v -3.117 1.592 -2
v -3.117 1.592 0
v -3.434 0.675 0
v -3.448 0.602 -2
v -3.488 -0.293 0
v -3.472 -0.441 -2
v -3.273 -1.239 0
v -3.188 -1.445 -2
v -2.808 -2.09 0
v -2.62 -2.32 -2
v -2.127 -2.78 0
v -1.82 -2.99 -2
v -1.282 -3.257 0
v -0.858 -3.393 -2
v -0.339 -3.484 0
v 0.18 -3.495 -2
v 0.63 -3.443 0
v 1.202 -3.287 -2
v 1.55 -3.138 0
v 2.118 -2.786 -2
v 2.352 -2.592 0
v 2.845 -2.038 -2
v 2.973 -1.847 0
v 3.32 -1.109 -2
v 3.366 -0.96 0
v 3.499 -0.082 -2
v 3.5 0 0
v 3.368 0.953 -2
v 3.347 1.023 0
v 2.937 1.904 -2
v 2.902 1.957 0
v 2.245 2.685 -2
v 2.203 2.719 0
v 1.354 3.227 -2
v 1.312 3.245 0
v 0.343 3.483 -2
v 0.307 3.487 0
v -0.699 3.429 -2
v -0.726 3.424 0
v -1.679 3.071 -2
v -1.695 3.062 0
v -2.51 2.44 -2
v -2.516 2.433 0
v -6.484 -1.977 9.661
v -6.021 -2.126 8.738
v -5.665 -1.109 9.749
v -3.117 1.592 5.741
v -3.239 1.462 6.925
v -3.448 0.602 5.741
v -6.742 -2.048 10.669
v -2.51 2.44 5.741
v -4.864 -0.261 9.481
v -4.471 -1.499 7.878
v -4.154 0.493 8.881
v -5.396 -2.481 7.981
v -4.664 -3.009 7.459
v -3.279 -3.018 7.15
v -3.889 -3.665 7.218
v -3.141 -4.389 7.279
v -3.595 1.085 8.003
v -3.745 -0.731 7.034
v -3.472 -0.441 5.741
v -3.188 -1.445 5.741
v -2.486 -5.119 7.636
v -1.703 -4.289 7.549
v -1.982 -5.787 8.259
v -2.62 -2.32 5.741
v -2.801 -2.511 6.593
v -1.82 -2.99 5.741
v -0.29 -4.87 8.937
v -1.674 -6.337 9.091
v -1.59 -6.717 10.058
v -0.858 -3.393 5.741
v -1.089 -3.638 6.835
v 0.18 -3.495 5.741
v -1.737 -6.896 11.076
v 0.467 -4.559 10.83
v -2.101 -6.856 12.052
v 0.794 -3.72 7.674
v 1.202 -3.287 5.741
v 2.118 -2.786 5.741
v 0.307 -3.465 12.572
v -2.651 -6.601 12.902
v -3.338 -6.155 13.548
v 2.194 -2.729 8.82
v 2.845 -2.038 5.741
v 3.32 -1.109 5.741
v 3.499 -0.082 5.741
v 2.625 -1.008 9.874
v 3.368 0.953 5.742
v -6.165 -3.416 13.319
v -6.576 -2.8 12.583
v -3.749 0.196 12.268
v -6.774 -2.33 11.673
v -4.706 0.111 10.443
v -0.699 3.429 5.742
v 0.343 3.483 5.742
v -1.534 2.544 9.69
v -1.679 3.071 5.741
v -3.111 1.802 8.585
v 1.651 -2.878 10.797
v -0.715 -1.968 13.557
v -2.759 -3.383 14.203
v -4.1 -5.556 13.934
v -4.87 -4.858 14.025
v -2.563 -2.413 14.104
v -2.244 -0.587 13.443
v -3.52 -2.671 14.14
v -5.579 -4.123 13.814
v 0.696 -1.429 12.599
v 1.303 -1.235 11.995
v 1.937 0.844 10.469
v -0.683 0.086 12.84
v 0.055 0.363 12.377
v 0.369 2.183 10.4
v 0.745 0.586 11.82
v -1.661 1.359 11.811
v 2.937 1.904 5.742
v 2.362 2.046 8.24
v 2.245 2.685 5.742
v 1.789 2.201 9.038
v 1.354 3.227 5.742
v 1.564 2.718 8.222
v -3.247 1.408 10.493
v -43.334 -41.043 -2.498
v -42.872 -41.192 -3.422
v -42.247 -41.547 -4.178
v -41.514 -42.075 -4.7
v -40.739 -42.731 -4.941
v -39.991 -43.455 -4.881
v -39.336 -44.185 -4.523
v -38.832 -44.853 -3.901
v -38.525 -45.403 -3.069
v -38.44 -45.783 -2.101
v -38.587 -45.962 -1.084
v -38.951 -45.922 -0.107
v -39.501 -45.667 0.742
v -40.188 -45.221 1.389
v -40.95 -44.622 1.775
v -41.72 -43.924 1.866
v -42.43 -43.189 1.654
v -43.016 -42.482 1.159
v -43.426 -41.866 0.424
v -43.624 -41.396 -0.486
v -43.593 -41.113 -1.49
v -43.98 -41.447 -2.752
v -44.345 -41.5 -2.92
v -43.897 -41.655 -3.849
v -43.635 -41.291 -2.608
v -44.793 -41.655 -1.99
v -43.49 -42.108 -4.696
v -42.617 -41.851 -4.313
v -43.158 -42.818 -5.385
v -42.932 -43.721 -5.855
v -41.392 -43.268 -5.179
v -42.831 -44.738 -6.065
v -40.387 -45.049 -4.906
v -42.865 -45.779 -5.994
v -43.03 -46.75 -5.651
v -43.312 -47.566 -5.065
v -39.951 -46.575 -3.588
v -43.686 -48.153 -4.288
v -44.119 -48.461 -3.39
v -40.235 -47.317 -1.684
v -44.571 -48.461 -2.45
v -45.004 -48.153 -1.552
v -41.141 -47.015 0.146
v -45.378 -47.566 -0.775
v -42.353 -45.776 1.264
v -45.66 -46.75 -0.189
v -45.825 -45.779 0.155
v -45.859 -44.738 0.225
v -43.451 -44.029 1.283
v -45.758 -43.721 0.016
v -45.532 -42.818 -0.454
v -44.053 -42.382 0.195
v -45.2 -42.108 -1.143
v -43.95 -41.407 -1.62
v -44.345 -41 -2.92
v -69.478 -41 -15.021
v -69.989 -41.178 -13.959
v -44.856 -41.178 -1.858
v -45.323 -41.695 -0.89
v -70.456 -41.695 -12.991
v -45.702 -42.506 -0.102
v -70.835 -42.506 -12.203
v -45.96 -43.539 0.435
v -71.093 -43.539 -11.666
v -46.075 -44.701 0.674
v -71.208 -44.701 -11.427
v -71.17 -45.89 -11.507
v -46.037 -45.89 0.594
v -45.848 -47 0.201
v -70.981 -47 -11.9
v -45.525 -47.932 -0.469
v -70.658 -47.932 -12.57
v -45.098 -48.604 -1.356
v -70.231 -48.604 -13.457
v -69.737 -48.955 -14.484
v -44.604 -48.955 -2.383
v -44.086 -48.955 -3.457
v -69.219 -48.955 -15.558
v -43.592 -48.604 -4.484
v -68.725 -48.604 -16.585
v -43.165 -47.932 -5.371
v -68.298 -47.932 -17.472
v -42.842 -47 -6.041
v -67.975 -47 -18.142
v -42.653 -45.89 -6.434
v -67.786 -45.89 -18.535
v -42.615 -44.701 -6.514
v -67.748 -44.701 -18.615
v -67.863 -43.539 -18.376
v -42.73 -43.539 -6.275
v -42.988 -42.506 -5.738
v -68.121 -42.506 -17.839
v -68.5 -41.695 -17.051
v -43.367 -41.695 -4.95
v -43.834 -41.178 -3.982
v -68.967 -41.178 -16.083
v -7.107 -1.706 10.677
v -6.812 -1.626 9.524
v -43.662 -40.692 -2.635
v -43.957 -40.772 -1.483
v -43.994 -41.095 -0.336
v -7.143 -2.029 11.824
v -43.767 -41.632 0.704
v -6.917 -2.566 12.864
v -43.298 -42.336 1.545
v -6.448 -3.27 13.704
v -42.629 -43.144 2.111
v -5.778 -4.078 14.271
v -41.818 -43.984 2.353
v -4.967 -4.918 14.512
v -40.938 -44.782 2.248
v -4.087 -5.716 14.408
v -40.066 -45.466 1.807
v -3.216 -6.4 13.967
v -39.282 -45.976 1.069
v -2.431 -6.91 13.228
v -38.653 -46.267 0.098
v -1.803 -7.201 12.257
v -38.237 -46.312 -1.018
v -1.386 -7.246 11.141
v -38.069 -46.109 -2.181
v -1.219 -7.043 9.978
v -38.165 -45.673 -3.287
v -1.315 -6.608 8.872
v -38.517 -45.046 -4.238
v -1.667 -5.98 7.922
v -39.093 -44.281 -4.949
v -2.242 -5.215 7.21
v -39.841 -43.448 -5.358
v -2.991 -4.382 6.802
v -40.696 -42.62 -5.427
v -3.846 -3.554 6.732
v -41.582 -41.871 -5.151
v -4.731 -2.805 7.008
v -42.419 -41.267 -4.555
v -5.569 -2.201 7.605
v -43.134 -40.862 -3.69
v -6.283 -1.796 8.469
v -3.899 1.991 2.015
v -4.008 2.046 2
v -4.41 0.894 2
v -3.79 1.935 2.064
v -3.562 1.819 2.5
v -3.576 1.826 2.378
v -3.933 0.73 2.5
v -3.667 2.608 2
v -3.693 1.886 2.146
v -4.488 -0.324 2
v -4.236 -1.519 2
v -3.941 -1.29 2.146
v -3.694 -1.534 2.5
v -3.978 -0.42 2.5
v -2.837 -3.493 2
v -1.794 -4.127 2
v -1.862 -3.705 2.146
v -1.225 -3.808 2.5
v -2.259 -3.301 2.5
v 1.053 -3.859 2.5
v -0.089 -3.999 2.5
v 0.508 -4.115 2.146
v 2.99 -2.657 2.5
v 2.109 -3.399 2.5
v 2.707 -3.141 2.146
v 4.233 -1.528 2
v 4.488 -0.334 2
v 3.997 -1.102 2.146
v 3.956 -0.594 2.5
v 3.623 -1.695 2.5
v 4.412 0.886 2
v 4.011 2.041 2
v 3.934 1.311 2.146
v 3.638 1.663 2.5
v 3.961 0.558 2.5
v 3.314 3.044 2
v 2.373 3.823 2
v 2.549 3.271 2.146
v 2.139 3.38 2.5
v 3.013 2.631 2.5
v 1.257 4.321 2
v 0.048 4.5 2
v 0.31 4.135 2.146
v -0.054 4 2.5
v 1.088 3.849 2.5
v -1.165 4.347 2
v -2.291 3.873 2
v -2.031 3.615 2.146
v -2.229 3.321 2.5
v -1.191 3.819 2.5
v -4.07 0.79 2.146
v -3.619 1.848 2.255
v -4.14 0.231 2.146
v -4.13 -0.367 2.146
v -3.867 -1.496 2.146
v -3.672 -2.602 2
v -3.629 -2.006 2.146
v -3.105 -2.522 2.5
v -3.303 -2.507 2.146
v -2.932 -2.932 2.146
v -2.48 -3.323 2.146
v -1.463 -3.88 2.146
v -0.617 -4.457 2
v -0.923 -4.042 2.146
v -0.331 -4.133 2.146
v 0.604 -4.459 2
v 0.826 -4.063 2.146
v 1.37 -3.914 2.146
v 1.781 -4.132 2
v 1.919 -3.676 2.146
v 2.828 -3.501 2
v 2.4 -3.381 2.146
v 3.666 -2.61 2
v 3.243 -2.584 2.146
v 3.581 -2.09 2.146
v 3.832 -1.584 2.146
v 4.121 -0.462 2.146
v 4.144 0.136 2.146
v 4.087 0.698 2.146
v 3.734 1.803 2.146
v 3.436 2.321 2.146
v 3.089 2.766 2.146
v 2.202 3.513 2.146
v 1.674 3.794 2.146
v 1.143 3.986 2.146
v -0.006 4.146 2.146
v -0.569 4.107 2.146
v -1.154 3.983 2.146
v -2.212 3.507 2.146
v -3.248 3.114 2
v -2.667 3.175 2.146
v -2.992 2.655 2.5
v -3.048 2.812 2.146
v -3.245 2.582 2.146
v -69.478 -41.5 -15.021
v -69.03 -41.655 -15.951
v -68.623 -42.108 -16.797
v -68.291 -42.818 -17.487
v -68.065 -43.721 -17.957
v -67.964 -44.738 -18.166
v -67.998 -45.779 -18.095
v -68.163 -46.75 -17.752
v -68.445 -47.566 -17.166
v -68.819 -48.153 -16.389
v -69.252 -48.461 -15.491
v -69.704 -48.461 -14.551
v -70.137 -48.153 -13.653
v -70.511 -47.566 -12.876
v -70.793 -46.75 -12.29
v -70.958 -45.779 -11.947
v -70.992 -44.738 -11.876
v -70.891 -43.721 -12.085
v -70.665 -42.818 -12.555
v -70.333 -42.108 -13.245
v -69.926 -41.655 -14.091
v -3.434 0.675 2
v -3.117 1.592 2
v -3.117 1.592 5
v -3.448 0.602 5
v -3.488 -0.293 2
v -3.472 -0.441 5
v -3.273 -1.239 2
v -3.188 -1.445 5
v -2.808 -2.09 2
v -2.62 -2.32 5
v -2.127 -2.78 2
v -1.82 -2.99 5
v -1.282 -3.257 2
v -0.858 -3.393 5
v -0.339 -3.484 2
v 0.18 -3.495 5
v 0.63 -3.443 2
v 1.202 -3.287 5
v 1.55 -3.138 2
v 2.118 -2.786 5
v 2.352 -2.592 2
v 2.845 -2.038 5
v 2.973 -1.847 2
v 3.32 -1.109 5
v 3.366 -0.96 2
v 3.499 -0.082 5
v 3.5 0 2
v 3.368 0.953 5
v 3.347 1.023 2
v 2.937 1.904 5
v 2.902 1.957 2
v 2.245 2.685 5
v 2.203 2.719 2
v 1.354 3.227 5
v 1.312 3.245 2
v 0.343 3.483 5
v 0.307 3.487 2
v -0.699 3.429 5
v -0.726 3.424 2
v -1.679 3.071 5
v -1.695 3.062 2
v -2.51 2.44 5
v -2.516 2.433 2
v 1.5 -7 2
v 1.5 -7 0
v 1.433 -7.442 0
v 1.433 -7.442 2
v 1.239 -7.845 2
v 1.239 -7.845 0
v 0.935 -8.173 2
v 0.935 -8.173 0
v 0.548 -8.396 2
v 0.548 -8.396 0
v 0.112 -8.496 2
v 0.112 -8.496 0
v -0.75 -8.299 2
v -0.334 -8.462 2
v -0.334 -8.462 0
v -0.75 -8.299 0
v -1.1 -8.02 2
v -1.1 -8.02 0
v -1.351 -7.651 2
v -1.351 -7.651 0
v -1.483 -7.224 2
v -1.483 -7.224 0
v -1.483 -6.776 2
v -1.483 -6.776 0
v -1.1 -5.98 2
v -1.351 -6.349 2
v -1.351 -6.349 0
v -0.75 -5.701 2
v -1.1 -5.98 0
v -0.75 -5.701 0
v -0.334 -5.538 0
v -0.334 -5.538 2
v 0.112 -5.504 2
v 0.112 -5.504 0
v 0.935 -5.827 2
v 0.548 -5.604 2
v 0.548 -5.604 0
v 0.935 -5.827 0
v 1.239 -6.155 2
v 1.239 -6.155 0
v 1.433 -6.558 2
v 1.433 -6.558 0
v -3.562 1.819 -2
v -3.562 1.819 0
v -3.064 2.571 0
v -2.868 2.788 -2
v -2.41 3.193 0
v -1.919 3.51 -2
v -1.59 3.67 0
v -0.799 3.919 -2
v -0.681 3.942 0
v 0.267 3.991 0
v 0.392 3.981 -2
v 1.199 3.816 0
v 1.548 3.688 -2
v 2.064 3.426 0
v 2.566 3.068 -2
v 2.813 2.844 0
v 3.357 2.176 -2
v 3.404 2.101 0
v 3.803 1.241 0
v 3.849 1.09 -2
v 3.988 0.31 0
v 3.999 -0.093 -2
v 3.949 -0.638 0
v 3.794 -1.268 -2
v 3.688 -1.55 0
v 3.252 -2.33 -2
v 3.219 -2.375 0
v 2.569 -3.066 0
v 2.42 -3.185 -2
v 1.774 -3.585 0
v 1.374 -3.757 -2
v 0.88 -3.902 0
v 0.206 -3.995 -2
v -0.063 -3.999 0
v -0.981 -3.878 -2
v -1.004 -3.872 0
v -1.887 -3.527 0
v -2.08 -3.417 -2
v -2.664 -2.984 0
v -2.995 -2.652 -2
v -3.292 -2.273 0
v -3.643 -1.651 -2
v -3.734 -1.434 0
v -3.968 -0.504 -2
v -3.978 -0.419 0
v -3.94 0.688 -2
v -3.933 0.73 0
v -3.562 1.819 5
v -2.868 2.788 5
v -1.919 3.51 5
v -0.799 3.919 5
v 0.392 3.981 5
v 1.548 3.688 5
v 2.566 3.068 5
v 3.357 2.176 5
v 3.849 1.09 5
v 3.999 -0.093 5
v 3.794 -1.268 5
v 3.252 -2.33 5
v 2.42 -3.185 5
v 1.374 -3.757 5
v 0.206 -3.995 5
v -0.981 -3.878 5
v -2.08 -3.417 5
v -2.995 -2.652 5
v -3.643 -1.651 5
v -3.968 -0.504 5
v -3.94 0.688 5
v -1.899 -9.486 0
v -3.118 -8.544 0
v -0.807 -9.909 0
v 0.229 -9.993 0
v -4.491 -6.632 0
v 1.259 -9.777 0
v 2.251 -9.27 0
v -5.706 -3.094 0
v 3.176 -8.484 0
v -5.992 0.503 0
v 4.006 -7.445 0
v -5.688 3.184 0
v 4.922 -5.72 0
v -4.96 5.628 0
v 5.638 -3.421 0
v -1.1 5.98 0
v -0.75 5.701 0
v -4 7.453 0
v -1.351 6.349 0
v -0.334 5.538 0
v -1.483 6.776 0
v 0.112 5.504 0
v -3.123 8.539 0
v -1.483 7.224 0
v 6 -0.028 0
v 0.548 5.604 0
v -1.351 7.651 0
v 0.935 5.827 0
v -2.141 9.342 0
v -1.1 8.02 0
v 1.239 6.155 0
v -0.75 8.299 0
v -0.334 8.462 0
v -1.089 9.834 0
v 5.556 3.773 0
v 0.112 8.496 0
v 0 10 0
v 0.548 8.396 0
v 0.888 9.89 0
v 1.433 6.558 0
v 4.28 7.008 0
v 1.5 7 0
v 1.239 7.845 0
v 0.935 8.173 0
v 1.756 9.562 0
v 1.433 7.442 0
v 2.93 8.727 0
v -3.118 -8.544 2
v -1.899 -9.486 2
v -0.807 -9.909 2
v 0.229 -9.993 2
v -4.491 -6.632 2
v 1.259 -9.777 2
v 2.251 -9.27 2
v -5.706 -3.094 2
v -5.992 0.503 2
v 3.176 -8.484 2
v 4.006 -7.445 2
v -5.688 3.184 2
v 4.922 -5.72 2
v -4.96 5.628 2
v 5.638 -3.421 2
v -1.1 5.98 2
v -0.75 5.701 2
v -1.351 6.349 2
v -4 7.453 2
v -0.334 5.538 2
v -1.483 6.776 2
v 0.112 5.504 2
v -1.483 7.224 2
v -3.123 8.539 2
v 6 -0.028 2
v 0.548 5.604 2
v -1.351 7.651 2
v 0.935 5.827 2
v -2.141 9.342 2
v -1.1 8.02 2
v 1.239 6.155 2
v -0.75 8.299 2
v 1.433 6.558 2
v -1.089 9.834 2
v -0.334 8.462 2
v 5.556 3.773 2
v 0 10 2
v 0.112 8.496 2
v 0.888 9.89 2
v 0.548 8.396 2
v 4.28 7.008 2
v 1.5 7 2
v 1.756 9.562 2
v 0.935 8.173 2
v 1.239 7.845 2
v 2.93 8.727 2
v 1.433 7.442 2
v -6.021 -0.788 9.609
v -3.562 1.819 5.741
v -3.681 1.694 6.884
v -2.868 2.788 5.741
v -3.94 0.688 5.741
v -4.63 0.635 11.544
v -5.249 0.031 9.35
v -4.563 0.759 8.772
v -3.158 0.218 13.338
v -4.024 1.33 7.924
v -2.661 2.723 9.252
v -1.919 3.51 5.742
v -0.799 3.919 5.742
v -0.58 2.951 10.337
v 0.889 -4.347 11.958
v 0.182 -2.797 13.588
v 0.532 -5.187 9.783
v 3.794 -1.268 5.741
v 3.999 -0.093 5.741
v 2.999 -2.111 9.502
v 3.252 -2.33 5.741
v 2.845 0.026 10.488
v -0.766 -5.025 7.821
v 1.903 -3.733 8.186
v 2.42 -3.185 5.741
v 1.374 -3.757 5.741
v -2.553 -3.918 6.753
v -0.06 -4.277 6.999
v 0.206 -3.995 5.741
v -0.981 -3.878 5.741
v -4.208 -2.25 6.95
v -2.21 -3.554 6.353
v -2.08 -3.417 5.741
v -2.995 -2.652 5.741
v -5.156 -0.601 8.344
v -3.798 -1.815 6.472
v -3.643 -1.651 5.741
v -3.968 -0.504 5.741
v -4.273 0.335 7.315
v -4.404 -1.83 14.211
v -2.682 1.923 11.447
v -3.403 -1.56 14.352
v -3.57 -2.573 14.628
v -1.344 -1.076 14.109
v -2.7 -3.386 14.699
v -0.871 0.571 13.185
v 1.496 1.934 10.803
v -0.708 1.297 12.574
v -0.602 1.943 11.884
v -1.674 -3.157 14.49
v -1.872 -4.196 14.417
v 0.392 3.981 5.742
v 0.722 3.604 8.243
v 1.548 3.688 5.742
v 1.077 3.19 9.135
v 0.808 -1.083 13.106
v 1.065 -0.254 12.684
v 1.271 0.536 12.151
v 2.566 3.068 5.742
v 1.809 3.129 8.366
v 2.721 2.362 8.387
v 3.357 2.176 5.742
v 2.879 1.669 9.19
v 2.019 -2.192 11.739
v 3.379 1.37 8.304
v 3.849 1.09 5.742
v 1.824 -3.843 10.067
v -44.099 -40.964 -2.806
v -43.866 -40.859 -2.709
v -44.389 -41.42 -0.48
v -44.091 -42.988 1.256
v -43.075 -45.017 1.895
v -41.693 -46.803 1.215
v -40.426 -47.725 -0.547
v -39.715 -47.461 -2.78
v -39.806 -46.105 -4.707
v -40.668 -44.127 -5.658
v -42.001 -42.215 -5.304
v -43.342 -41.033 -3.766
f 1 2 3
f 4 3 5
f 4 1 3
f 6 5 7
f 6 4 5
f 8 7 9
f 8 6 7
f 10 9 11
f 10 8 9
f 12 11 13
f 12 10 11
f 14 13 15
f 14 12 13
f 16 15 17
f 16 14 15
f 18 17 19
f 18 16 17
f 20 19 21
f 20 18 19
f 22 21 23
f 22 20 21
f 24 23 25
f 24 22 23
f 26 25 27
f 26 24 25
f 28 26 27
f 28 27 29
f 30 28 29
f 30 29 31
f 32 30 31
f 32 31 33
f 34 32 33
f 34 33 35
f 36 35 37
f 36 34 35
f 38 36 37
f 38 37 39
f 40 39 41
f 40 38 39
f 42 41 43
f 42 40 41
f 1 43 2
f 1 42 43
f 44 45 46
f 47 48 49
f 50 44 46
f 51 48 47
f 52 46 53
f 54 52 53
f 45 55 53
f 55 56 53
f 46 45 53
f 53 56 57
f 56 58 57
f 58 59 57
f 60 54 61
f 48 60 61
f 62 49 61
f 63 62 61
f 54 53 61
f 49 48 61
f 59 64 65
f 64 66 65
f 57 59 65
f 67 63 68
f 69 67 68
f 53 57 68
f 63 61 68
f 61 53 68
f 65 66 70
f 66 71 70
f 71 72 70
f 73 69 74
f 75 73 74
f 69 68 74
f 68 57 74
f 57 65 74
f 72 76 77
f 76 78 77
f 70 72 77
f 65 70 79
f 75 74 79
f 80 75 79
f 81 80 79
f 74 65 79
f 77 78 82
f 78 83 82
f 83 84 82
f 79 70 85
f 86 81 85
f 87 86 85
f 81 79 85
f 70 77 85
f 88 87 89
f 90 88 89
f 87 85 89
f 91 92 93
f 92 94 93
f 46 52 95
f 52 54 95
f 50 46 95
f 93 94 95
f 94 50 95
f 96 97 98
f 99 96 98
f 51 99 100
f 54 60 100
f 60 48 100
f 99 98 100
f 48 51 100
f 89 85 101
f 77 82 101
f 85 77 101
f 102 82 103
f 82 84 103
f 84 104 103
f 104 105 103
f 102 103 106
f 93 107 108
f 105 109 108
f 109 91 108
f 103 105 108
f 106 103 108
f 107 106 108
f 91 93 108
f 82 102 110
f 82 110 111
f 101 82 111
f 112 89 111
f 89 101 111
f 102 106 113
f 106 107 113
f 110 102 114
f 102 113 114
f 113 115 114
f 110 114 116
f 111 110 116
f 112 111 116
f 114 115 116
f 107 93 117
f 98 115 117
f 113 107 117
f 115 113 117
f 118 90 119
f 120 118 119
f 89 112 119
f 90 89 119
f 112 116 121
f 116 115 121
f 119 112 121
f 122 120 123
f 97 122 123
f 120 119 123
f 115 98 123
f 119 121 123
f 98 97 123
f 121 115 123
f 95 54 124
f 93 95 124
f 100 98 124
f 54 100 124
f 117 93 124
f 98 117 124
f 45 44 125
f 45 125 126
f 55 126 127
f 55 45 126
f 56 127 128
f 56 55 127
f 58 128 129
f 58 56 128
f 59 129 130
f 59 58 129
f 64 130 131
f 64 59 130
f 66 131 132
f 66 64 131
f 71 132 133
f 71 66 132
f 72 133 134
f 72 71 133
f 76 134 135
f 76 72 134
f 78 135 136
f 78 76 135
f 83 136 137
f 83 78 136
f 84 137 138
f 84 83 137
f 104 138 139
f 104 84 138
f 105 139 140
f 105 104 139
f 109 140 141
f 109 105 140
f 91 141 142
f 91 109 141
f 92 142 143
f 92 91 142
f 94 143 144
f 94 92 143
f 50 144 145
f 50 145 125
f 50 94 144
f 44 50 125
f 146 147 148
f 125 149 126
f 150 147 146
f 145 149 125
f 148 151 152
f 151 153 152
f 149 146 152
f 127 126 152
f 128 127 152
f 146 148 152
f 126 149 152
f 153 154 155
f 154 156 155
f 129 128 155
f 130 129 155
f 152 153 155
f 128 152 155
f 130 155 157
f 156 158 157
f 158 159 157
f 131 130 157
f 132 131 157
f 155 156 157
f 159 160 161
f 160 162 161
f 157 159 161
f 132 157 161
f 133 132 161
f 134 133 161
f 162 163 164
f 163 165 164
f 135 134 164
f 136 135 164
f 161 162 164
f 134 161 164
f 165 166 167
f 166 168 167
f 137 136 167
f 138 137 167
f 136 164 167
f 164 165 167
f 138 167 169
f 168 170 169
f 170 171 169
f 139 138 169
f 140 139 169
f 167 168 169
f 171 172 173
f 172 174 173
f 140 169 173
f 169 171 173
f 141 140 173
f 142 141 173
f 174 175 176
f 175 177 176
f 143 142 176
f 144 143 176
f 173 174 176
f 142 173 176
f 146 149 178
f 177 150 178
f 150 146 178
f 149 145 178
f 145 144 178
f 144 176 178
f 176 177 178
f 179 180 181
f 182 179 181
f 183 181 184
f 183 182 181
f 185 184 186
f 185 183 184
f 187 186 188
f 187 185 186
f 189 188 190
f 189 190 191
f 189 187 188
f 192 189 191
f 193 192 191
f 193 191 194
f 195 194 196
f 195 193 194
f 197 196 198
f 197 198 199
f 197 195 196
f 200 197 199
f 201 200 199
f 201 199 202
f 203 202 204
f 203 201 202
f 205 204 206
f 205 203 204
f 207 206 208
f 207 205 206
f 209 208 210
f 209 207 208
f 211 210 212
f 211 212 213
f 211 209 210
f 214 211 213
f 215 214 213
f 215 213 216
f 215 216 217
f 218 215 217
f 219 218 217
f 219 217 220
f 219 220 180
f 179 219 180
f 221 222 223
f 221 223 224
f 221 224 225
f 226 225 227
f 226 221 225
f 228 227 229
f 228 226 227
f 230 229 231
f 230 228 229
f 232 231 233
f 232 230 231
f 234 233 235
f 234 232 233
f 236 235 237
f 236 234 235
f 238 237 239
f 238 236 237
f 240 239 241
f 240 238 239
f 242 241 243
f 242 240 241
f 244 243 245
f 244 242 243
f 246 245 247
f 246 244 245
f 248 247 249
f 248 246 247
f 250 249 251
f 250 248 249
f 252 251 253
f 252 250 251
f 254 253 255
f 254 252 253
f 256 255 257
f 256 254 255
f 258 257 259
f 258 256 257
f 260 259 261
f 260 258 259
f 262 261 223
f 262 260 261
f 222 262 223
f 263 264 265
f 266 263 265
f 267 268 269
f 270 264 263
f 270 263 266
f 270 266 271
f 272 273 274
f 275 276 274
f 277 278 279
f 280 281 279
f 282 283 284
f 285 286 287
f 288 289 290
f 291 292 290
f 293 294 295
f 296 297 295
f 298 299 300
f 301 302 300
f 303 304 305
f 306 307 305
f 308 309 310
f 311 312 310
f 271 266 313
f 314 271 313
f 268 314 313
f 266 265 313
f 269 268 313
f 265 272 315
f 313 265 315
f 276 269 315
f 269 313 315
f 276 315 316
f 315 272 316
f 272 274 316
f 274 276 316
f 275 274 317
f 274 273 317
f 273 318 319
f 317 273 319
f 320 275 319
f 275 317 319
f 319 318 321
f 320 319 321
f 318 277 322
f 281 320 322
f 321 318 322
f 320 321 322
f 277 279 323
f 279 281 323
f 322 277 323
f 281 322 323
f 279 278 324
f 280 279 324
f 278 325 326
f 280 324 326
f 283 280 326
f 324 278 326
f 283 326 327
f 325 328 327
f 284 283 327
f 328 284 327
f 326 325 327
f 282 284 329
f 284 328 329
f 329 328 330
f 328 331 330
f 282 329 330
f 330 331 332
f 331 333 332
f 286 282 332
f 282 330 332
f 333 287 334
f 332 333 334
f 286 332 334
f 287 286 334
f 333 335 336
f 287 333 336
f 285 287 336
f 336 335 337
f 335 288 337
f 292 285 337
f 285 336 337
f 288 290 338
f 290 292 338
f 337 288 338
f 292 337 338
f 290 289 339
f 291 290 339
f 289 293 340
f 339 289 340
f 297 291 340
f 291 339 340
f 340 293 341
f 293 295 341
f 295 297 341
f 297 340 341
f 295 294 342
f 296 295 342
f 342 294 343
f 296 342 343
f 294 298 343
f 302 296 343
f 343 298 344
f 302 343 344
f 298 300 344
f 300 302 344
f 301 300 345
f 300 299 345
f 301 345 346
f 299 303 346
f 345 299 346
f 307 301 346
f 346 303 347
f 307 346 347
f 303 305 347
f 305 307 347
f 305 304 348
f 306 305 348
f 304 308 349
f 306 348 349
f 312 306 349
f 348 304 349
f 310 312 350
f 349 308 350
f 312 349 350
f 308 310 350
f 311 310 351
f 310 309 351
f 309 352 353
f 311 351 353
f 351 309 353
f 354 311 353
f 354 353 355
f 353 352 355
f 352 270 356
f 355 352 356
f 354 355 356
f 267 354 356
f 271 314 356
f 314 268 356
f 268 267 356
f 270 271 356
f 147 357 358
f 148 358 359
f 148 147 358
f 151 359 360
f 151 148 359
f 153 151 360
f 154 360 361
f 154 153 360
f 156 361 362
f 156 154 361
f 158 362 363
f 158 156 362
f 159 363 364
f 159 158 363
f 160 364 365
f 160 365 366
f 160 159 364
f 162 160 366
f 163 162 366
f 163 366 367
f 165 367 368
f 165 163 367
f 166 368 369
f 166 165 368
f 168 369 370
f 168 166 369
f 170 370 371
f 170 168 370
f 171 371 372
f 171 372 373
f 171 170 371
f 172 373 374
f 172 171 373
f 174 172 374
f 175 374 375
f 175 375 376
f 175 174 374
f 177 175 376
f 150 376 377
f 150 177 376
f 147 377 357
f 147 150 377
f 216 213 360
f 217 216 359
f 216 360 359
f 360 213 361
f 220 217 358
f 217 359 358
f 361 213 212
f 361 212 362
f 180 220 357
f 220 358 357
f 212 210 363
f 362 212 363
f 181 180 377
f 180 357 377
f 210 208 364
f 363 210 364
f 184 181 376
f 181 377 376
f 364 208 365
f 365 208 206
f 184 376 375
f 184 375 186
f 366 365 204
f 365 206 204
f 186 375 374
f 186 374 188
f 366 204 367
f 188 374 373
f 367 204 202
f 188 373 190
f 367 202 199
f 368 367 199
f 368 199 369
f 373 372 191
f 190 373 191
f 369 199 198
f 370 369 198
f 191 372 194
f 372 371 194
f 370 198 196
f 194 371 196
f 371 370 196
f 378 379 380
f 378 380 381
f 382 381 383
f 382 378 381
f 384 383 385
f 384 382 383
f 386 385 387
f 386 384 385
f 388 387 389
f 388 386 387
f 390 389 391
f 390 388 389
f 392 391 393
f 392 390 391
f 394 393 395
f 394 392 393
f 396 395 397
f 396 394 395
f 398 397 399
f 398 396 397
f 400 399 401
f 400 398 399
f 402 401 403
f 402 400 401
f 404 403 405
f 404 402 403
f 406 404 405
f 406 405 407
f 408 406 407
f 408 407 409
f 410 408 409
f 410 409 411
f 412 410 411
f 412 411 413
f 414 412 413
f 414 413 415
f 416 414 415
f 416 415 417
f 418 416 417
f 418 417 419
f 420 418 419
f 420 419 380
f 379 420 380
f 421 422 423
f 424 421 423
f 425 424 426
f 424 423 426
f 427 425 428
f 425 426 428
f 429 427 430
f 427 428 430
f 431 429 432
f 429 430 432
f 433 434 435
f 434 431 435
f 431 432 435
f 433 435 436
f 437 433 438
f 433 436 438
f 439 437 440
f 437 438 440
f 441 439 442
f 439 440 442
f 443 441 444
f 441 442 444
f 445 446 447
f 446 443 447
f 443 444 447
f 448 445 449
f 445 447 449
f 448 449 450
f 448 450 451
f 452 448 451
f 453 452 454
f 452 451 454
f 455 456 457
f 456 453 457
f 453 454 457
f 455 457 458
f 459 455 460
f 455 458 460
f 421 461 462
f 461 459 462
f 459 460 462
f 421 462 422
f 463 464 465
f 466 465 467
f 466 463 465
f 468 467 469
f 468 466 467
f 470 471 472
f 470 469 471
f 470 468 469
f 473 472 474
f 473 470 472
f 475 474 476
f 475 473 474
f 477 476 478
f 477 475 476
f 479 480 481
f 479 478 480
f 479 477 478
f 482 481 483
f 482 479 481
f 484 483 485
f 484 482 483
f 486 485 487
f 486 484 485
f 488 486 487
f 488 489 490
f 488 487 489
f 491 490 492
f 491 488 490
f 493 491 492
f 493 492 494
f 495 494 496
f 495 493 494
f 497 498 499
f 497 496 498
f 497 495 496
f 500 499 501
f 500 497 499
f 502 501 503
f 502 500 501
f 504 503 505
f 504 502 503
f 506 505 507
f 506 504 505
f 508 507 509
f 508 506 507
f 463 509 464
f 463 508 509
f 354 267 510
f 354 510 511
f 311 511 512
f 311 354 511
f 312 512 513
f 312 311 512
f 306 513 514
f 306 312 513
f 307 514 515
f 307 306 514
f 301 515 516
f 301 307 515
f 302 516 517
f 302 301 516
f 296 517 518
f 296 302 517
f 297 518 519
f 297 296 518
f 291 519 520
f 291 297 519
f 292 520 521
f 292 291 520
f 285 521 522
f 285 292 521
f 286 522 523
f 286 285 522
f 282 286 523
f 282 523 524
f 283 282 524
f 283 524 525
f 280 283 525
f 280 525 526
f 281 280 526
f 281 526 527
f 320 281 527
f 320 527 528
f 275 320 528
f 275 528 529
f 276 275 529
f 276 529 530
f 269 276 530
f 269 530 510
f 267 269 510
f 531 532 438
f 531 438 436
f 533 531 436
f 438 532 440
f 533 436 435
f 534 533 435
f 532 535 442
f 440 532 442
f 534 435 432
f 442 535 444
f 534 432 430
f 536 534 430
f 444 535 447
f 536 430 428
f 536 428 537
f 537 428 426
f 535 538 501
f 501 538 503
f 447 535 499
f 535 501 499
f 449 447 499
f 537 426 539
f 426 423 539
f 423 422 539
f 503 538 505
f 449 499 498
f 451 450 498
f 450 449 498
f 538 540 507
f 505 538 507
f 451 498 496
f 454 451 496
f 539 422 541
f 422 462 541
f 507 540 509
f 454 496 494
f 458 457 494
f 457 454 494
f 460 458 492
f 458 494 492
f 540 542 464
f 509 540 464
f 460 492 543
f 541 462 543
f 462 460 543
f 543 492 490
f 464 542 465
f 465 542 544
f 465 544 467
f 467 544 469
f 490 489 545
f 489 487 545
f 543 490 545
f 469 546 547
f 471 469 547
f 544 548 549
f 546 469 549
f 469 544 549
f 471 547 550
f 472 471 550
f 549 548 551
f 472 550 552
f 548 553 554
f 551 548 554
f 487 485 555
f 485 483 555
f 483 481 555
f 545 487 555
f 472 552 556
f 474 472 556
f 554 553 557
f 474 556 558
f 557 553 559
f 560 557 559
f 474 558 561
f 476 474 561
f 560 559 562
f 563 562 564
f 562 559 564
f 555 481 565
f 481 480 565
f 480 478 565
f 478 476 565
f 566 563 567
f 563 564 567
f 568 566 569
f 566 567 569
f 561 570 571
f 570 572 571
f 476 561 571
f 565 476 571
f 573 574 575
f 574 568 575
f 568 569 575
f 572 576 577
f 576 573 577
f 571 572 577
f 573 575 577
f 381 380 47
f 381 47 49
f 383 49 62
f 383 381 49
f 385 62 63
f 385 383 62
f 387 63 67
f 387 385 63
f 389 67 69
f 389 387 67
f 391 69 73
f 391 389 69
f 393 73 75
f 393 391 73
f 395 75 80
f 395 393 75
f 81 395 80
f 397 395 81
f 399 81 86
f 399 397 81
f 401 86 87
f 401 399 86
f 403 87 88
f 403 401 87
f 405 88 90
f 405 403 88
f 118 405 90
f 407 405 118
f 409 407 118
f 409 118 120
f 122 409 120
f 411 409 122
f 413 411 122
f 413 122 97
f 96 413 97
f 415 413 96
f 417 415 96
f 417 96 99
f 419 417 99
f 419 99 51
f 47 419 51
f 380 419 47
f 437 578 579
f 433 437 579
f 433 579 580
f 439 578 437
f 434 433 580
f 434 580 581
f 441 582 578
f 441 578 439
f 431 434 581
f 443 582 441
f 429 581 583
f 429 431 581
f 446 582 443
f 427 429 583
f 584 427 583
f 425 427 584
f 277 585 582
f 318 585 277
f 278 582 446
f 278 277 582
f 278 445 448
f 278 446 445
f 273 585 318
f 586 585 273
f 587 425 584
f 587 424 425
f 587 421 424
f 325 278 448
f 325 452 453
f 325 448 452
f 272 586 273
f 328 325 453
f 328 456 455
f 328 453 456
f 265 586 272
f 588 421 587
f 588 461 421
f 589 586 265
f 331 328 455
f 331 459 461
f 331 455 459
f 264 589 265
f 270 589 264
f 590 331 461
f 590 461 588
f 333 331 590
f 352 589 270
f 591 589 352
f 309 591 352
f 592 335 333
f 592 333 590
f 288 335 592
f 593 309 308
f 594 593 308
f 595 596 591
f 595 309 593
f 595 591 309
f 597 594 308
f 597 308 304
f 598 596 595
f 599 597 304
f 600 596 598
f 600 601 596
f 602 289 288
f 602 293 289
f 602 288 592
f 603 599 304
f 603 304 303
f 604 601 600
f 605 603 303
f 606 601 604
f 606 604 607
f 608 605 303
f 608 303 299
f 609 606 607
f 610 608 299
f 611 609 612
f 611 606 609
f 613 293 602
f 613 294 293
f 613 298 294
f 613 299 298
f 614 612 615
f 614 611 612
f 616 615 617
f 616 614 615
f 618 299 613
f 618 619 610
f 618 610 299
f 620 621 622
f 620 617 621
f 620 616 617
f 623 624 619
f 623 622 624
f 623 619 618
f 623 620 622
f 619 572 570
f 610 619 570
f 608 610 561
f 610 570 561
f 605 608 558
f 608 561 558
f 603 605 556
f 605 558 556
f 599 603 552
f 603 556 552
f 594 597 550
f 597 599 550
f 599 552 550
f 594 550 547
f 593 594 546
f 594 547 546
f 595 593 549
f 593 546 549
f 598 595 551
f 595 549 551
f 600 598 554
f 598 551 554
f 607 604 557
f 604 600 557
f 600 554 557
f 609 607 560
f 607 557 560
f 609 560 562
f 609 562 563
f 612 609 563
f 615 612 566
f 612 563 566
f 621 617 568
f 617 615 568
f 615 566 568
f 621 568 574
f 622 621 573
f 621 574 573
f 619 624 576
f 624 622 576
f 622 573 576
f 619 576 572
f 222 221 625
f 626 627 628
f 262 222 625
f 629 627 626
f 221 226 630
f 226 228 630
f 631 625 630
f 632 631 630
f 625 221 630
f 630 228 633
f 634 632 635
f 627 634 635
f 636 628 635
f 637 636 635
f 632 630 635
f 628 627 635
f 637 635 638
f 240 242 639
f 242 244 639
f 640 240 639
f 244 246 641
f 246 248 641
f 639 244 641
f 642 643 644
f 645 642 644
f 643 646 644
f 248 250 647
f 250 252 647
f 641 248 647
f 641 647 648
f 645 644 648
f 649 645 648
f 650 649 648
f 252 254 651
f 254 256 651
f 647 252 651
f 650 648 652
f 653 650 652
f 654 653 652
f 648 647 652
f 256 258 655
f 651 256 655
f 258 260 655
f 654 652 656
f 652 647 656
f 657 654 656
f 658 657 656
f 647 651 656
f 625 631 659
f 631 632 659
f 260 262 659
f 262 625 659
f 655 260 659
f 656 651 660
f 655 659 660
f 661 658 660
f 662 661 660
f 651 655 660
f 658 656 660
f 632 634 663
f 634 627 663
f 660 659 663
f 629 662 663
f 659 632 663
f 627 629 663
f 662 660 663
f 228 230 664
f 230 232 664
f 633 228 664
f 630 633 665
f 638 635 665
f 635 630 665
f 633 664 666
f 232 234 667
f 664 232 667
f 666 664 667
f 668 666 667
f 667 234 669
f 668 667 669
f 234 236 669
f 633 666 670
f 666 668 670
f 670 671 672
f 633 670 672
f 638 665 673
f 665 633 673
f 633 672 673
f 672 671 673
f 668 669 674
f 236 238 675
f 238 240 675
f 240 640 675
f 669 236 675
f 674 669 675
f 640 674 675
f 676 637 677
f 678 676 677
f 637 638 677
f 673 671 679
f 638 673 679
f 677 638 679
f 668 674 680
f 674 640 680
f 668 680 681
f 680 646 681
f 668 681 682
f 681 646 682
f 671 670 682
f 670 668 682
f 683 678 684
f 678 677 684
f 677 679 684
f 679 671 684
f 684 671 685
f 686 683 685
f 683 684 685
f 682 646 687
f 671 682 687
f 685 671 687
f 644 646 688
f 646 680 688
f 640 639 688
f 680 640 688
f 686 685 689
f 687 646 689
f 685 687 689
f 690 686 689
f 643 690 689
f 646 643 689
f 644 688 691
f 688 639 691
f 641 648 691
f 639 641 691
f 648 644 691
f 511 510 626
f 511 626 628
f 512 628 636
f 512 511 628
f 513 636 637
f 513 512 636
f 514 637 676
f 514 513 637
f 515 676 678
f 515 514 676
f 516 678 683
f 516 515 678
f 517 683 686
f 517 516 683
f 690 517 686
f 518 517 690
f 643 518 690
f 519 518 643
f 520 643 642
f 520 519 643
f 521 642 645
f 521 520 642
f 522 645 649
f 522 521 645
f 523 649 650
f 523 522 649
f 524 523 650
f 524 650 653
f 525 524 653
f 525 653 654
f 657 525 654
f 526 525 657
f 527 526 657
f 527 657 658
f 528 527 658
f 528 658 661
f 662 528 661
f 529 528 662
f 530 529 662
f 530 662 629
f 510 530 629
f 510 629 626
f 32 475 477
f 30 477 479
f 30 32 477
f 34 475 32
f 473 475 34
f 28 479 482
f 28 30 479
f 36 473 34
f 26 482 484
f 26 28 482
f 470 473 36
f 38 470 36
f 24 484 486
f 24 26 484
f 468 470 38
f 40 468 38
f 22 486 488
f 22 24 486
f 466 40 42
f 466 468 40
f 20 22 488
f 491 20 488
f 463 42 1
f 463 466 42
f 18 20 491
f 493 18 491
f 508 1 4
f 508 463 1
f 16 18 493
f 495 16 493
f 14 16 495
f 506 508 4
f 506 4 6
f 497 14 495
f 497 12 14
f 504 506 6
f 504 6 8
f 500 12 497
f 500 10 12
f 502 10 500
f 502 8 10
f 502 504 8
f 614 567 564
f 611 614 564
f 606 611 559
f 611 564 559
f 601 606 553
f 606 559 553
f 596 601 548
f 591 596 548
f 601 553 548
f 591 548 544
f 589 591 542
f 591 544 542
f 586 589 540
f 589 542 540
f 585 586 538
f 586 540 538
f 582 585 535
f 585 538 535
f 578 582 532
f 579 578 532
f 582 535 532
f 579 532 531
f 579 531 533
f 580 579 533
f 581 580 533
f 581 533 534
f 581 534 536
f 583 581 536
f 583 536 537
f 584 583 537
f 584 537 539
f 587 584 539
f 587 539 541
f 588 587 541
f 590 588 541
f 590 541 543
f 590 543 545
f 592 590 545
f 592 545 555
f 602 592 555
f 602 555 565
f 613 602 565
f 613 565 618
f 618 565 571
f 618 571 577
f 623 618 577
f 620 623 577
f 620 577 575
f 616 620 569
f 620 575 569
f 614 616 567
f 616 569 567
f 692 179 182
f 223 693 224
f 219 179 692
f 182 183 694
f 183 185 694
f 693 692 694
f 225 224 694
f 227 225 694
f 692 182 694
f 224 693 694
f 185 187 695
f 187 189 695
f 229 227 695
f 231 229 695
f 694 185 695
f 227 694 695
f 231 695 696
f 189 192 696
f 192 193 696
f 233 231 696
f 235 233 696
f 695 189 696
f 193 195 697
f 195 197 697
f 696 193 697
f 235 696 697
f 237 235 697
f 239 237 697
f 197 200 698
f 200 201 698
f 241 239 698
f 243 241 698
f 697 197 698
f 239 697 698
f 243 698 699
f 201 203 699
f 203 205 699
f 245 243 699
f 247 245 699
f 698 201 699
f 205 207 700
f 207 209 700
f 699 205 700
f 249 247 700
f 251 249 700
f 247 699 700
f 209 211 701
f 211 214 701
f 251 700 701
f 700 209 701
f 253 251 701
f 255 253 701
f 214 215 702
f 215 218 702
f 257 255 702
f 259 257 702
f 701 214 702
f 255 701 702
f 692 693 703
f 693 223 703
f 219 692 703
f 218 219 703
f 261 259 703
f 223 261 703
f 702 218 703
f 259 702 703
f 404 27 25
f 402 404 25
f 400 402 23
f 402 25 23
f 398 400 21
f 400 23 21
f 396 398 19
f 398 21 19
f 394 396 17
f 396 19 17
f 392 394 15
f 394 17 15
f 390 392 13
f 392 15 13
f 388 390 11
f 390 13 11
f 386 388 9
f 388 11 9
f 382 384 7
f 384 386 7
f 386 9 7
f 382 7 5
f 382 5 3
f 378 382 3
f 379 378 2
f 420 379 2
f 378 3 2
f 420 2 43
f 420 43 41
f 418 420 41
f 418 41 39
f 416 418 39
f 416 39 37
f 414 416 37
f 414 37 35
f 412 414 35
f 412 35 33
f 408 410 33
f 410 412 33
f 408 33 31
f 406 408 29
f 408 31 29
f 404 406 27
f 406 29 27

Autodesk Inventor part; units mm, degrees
ref_plane "YZ Plane" through (0, 0, 0) normal (1, 0, 0) x (0, 1, 0)
sketch "Sketch1" plane through (0, 0, 0) normal (0, 0, 1) x (1, 0, 0)
  line L0 (0, 0) -> (0, 10) construction
  line L1 (0, 0) -> (6, 0) construction
  circle A0 centre (0, 0) radius 3.5
  circle A1 centre (0, 7) radius 1.5
  circle A2 centre (0, -7) radius 1.5
  ellipse E0 centre (0, 0) end of major axis (6, 0) minor radius 10
  dimension "d0" = 10
  dimension "d1" = 6
  dimension "d2" = 7
  dimension "d4" = 3
  dimension "d5" = 3
  dimension "d6" = 7
  dimension "d7" = 7
extrude "Extrusion1" add sketch "Sketch1" along normal blind 2
sketch "Sketch2" plane through (0, 0, 0) normal (1, 0, 0) x (0, 1, 0)
  line L0 (0, -2) -> (0, 5) construction
  point P0 (0, 0)
  dimension "d10" = 2
  dimension "d11" = 7
ref_plane "Work Plane1" through (0, -45, 0) normal (0, 1, 0) x (-1, 0, 0)
sketch "Sketch3" plane through (0, -45, 0) normal (0, 1, 0) x (-1, 0, 0)
  line L0 (0, 0) -> (0, -83.2566) construction
  line L1 (69.478, -15.021) -> (43.1392, -69.7245) construction
  line L2 (69.478, -15.021) -> (42.448, -2.0065) construction
  dimension "d13" = 25.71
  dimension "d14" = 69.478
  dimension "d16" = 15.021
  dimension "d17" = 30
  dimension "d18" = 90
ref_plane "Work Plane2" through (-69.478, -45, -15.021) normal (0.9010013, 0, 0.4338163) x (0, 1, 0)
sketch "Sketch4" plane through (-69.478, -45, -15.021) normal (0.9010013, 0, 0.4338163) x (0, 1, 0)
  circle A0 centre (0, 0) radius 4
  circle A1 centre (0, 0) radius 3.5
  point P0 (45, -16.6068)
  dimension "d19" = 8
  dimension "d20" = 7
sketch3d "3D Sketch1"
  line L0 (-69.478, -45, -15.021) -> (-44.345, -45, -2.9199)
  arc A0 (-44.345, -45, -2.9199) -> (-41.0389, -43.5063, -1.5416) centre (-44.0679, -40.0409, -3.4952) ccw
  line L1 (-41.0389, -43.5063, -1.5416) -> (-4.1885, -4.4404, 10.6179)
  arc A1 (-4.1885, -4.4404, 10.6179) -> (0, 0, 5.7414) centre (-3.4309, -3.6372, 5.7414) ccw
  line L2 (0, 0, 5.7414) -> (0, 0, 5)
  line L3 (0, 0, 5) -> (0, 0, -2)
  dimension "d21" = 5
  dimension "d22" = 5
  dimension "d23" = 7
sweep "Sweep1" add profiles "Sketch4" path "3D Sketch1"
fillet "Fillet1" radius 0.5 1 edges at (3.5625, -1.819, 2)
equation "\"d7\" = d6"
equation "\"d22\" = d21"
properties part number "Component 51(Intake Pipe)"
